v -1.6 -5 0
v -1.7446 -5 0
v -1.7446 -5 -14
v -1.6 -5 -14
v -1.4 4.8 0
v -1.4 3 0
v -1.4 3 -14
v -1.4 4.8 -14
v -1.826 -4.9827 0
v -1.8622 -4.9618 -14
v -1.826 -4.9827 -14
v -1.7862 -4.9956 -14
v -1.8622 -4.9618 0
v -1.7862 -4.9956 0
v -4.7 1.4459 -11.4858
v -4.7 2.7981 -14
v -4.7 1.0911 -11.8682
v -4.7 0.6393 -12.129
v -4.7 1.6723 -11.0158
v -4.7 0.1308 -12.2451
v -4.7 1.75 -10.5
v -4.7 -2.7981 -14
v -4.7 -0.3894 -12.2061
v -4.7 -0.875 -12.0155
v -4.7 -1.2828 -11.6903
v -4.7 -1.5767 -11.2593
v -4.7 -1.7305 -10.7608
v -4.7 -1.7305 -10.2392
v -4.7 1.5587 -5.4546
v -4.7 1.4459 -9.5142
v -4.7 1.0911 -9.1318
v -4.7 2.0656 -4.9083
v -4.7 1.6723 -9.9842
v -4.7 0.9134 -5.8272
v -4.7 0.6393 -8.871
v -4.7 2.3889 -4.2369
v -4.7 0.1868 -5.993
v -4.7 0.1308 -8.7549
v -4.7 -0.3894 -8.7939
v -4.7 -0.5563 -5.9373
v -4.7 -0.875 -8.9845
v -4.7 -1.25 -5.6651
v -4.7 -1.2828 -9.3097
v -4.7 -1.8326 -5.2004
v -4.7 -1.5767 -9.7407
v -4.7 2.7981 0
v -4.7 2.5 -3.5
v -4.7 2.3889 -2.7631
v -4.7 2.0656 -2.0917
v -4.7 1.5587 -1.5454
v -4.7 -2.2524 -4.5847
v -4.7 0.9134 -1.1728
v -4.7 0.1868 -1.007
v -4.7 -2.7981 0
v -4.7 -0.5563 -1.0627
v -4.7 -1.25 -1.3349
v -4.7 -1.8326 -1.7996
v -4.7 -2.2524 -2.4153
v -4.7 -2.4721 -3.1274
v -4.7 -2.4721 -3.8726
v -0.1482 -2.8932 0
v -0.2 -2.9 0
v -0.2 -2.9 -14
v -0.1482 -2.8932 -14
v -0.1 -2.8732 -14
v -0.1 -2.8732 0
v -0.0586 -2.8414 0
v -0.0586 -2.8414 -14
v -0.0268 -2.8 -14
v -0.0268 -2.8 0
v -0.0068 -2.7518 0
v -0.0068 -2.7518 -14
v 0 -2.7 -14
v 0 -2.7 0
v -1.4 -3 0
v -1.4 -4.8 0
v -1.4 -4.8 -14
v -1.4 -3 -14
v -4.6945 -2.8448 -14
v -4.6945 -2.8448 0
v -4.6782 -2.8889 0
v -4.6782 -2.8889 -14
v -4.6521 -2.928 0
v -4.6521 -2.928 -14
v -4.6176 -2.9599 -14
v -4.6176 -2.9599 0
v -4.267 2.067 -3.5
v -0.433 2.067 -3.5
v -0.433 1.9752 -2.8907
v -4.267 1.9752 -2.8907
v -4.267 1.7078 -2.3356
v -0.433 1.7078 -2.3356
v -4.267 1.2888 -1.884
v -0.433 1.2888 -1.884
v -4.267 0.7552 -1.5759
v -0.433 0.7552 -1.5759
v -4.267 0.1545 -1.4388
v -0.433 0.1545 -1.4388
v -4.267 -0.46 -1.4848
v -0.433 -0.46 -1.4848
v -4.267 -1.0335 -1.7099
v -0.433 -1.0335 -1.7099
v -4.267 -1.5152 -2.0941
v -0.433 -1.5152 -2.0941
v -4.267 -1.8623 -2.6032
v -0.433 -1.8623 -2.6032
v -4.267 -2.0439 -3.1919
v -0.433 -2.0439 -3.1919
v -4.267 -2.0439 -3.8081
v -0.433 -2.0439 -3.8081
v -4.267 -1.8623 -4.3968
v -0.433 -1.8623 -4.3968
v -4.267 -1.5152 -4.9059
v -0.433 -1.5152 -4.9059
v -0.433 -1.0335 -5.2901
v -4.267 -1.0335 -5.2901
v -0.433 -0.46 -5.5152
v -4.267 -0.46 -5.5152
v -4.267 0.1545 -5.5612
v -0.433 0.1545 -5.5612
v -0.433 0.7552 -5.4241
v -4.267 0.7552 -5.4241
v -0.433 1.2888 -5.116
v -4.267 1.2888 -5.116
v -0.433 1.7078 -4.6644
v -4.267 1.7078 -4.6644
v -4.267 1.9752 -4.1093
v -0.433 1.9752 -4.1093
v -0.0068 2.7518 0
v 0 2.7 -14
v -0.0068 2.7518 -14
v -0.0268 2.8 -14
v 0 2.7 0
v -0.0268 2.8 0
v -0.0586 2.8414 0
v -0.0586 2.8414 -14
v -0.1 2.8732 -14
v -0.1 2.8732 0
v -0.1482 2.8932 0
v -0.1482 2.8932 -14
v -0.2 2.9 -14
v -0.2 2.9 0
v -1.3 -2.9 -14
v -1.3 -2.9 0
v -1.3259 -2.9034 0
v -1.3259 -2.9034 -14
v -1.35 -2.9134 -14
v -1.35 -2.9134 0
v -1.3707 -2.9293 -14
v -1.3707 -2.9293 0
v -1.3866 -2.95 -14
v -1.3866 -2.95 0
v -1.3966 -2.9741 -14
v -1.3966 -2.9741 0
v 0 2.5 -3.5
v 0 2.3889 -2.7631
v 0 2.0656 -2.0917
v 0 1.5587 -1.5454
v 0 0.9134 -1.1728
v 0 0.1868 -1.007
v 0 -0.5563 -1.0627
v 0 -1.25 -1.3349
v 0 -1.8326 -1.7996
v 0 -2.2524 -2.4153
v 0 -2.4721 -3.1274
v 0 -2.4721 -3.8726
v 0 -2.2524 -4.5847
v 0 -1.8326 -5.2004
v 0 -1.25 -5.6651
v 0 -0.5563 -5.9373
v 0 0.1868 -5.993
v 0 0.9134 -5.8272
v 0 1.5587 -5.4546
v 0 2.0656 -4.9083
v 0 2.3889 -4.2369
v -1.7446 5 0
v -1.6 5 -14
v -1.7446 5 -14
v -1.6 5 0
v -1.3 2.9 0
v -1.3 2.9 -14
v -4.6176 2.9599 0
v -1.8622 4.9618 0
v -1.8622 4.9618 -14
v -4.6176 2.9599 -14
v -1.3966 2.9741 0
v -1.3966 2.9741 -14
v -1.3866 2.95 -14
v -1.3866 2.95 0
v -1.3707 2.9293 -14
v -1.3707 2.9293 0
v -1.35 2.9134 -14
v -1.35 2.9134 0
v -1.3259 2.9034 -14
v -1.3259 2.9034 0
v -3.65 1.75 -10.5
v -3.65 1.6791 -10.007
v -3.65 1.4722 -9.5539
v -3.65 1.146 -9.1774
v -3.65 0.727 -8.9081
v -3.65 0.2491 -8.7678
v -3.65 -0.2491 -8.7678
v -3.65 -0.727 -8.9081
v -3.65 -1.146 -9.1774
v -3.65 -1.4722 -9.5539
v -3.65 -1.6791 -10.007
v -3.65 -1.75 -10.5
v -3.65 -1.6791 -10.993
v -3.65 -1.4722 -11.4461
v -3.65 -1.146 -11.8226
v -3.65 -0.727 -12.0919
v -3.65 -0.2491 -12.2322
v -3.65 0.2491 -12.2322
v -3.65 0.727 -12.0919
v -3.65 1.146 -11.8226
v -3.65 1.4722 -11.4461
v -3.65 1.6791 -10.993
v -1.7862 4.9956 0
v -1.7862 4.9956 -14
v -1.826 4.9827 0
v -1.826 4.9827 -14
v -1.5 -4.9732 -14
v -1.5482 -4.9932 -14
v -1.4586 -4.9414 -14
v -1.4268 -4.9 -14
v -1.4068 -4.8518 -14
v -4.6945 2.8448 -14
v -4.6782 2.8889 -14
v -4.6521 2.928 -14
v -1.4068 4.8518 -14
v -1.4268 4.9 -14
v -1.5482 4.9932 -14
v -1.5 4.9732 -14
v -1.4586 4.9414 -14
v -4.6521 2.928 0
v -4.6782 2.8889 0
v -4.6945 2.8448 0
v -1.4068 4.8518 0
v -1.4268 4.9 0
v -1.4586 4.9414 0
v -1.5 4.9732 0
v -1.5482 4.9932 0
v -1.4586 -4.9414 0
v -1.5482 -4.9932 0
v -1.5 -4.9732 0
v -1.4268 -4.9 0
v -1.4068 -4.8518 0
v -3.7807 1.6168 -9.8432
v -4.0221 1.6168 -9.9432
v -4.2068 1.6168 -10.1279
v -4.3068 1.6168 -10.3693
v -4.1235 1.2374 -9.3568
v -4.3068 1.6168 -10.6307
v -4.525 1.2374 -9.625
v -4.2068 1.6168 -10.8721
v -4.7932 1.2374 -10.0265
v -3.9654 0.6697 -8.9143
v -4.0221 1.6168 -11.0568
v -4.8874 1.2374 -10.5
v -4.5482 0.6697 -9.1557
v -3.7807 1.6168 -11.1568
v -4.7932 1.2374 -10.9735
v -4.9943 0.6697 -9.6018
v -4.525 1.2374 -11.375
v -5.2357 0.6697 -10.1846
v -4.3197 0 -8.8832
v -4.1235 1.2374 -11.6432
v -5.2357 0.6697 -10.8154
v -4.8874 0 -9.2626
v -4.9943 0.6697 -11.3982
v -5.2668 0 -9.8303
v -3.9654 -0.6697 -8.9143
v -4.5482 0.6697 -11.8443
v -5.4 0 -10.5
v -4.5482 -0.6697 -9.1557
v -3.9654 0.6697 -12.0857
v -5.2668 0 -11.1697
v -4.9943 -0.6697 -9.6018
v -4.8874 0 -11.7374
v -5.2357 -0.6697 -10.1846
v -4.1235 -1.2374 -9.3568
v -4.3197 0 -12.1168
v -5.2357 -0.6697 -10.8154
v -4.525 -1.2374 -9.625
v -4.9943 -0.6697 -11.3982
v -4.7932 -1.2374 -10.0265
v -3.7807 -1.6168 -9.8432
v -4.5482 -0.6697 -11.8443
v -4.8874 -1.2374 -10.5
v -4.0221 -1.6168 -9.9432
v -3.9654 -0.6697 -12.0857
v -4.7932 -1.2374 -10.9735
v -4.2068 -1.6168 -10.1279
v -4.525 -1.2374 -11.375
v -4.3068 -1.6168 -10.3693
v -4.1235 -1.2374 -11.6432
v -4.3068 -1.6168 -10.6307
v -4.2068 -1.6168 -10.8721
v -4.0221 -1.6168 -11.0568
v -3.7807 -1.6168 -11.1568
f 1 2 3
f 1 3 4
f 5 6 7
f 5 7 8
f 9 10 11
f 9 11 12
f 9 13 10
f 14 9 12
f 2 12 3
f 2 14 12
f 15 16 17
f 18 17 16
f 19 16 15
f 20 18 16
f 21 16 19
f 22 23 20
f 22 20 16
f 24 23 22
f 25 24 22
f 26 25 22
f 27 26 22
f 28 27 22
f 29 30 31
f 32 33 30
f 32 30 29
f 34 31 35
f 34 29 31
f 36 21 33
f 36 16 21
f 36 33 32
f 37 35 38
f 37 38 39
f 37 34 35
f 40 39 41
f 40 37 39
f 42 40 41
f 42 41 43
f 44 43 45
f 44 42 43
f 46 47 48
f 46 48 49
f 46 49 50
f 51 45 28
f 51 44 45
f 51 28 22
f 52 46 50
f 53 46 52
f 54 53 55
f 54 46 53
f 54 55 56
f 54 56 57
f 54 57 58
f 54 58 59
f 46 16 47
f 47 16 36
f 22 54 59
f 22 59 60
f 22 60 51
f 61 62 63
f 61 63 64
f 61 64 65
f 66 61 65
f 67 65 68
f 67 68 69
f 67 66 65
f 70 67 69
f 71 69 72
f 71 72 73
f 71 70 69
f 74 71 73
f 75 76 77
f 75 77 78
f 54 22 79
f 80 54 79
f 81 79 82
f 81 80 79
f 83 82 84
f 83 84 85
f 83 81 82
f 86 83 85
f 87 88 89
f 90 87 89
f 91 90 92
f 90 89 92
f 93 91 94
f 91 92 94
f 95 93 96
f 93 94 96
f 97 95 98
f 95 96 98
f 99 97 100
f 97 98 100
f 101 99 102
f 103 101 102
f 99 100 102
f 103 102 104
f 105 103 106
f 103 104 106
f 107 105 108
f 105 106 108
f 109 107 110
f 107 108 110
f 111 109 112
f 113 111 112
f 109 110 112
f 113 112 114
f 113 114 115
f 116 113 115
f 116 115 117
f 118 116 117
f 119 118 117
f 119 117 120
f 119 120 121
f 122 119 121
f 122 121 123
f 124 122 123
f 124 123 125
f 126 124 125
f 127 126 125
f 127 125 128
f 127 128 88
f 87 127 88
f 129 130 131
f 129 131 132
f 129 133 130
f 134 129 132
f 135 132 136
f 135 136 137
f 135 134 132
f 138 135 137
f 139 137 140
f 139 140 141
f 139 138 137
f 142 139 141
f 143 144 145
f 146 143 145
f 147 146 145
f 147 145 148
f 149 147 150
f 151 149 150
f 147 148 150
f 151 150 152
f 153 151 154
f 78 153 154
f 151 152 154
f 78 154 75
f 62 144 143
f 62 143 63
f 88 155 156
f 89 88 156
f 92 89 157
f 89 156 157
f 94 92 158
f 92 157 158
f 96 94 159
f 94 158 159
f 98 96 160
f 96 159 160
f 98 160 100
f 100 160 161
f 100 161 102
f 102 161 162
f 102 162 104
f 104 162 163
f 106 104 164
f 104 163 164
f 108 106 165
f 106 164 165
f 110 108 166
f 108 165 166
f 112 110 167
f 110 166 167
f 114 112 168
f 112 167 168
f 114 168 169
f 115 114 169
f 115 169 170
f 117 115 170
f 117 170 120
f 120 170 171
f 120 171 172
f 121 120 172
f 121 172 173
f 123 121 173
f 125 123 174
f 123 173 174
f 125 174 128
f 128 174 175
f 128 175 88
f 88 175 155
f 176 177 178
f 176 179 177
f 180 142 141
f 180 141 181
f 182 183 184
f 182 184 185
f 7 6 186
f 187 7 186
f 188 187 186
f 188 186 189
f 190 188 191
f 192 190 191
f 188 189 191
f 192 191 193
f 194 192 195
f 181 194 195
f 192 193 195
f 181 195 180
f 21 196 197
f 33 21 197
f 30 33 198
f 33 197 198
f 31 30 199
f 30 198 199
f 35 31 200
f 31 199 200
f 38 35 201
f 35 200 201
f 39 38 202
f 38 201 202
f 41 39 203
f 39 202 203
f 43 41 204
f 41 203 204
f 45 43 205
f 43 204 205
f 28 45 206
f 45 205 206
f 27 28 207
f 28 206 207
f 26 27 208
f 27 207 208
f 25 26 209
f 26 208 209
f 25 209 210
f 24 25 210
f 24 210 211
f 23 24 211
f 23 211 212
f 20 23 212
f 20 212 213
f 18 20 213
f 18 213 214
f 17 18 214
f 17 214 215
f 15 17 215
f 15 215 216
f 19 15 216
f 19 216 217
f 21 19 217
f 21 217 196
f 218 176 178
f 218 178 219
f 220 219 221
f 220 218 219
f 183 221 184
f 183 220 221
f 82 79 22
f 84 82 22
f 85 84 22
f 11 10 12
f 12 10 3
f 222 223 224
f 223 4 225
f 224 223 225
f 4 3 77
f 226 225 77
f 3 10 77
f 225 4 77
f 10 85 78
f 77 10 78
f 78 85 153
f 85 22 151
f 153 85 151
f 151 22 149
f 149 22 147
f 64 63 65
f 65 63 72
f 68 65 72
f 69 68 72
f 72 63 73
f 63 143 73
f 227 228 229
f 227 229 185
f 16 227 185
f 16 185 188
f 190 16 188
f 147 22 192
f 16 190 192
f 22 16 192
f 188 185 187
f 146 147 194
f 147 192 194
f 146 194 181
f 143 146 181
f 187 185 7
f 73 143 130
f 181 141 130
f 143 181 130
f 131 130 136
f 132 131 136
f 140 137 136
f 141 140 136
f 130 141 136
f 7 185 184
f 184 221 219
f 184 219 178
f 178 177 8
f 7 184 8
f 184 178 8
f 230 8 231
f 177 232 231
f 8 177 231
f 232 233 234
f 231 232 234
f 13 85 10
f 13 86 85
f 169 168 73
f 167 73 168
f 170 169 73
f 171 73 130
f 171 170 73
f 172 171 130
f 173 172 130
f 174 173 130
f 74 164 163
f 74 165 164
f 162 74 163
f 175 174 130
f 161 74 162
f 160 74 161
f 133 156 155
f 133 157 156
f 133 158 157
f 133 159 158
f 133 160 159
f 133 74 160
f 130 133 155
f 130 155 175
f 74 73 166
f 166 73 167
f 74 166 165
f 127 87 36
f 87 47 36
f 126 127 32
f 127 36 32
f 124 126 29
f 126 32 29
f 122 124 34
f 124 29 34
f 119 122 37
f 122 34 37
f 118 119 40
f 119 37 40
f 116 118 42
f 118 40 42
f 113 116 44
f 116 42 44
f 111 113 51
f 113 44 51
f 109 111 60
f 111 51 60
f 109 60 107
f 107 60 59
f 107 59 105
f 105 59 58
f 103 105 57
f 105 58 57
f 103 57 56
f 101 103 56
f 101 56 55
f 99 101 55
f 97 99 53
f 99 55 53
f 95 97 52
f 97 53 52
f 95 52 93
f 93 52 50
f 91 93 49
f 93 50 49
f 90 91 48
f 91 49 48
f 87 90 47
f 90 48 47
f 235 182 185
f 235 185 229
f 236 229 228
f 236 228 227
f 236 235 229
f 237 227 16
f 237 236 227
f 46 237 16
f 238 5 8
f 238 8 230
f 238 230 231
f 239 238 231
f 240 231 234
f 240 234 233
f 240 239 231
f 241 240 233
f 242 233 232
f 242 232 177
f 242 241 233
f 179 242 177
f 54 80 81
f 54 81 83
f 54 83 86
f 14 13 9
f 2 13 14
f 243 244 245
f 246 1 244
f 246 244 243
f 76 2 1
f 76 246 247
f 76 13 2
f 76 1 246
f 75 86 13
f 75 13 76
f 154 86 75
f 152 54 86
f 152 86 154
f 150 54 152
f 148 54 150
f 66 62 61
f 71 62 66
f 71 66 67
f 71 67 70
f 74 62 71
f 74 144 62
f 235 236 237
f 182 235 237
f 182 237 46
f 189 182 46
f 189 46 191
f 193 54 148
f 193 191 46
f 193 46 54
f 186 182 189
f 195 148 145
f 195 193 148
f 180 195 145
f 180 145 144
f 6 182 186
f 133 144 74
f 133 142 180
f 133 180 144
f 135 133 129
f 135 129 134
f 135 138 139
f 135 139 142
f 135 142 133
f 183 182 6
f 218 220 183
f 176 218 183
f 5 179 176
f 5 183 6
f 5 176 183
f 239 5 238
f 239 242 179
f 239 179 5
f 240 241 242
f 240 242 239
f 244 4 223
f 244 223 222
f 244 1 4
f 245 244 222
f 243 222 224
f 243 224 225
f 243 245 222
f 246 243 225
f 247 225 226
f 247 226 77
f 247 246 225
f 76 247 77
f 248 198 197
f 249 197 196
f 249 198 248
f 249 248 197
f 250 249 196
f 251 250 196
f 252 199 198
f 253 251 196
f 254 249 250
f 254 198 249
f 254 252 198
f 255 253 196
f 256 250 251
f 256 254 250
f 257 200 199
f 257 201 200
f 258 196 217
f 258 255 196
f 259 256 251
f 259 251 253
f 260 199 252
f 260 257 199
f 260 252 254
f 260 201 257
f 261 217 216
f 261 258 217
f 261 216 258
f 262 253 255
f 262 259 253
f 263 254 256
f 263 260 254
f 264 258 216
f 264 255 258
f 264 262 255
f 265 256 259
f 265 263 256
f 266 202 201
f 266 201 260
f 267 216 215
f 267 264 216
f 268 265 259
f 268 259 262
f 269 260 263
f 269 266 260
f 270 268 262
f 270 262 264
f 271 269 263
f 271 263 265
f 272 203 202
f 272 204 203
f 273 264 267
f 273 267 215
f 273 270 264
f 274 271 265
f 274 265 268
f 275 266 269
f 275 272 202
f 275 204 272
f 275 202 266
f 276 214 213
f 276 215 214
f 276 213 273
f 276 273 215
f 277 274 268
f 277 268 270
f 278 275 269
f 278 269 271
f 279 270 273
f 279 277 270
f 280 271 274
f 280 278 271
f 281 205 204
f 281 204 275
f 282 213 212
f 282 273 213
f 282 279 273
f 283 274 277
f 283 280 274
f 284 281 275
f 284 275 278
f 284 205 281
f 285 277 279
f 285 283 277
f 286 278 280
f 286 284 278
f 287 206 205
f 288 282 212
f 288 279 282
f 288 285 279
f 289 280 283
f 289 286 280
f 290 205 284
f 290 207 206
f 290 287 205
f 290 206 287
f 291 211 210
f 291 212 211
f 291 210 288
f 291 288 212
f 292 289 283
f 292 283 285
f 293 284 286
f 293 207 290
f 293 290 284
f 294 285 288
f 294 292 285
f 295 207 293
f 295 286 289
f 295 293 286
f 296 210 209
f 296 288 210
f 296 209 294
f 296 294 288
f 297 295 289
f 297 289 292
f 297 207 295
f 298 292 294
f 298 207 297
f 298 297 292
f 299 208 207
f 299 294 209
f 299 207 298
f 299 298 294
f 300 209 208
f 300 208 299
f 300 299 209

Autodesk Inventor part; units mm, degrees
sketch "_____1" plane through (0, 0, 0) normal (0, 0, 1) x (1, 0, 0)
  line L0 (-4.7, 2.7981) -> (-4.7, -2.7981)
  arc A0 (-4.7, -2.7981) -> (-4.6176, -2.9599) centre (-4.5, -2.7981) ccw
  line L1 (-4.6176, -2.9599) -> (-1.8622, -4.9618)
  arc A1 (-1.8622, -4.9618) -> (-1.7446, -5) centre (-1.7446, -4.8) ccw
  line L2 (-1.7446, -5) -> (-1.6, -5)
  arc A2 (-1.6, -5) -> (-1.4, -4.8) centre (-1.6, -4.8) ccw
  line L3 (-1.4, -4.8) -> (-1.4, -3)
  arc A3 (-1.3, -2.9) -> (-1.4, -3) centre (-1.3, -3) ccw
  line L4 (-1.3, -2.9) -> (-0.2, -2.9)
  arc A4 (-0.2, -2.9) -> (0, -2.7) centre (-0.2, -2.7) ccw
  line L5 (0, -2.7) -> (0, 2.7)
  arc A5 (0, 2.7) -> (-0.2, 2.9) centre (-0.2, 2.7) ccw
  line L6 (-0.2, 2.9) -> (-1.3, 2.9)
  arc A6 (-1.4, 3) -> (-1.3, 2.9) centre (-1.3, 3) ccw
  line L7 (-1.4, 3) -> (-1.4, 4.8)
  arc A7 (-1.4, 4.8) -> (-1.6, 5) centre (-1.6, 4.8) ccw
  line L8 (-1.6, 5) -> (-1.7446, 5)
  arc A8 (-1.7446, 5) -> (-1.8622, 4.9618) centre (-1.7446, 4.8) ccw
  line L9 (-1.8622, 4.9618) -> (-4.6176, 2.9599)
  arc A9 (-4.6176, 2.9599) -> (-4.7, 2.7981) centre (-4.5, 2.7981) ccw
extrude "Extrusion1" add sketch "_____1" against normal blind 14
sketch "_____2" plane through (0, 0, -3.5) normal (0, 0, 1) x (1, 0, 0)
  line L0 (0, 0) -> (-4.7, 0)
  line L1 (-4.7, 0) -> (-4.7, 2.5)
  line L2 (-4.7, 2.5) -> (-4.267, 2.067)
  line L3 (-4.267, 2.067) -> (-0.433, 2.067)
  line L4 (-0.433, 2.067) -> (0, 2.5)
  line L5 (0, 2.5) -> (0, 0)
  line L6 (0, 0) -> (-4.7, 0)
revolve "Revolution1" cut sketch "_____2" angle 360 about axis through (0, 0, -3.5) along (1, 0, 0)
thread "Thread1" size "M5x0.8" class "6H" standard "ISO Metric profile" full length
sketch "_____3" plane through (0, 0, -10.5) normal (0, 0, 1) x (1, 0, 0)
  line L0 (-3.65, 0) -> (-5.4, 0)
  line L1 (-5.4, 0) -> (-5.4, 1.75)
  line L2 (-5.4, 1.75) -> (-3.65, 1.75)
  line L3 (-3.65, 1.75) -> (-3.65, 0)
  line L4 (-3.65, 0) -> (-5.4, 0)
revolve "Revolution2" cut sketch "_____3" angle 360 about axis through (-3.65, 0, -10.5) along (1, 0, 0)
sketch "_____4" plane through (0, 0, -10.5) normal (0, 0, 1) x (1, 0, 0)
  line L0 (-3.65, 1.75) -> (-3.65, -1.75)
  arc A0 (-3.65, 1.75) -> (-3.65, -1.75) centre (-3.65, 0) ccw
  line L1 (-3.65, 1.75) -> (-3.65, -1.75)
revolve "Revolution3" add sketch "_____4" angle 360 about axis through (-3.65, 1.75, -10.5) along (0, 1, 0)
ref_plane "to_blackets_XY" through (0, 0, -3.5) normal (1, 0, 0) x (0, 0, -1)
ref_plane "to_blackets_YZ" through (0, 0, -3.5) normal (0, 0, -1) x (0, 1, 0)
ref_plane "to_blackets_ZX" through (0, 0, -3.5) normal (0, 1, 0) x (1, 0, 0)
ref_plane "to_bolt_XY" through (-4.7, 0, -3.5) normal (1, 0, 0) x (0, 0, -1)
ref_plane "to_bolt_YZ" through (-4.7, 0, -3.5) normal (0, 0, -1) x (0, 1, 0)
ref_plane "to_bolt_ZX" through (-4.7, 0, -3.5) normal (0, 1, 0) x (1, 0, 0)
ref_plane "to_frames_XY" through (-1.4, 0, -3.5) normal (1, 0, 0) x (0, 0, -1)
ref_plane "to_frames_YZ" through (-1.4, 0, -3.5) normal (0, 0, -1) x (0, 1, 0)
ref_plane "to_frames_ZX" through (-1.4, 0, -3.5) normal (0, 1, 0) x (1, 0, 0)
properties part number "SHNTU5-5"
